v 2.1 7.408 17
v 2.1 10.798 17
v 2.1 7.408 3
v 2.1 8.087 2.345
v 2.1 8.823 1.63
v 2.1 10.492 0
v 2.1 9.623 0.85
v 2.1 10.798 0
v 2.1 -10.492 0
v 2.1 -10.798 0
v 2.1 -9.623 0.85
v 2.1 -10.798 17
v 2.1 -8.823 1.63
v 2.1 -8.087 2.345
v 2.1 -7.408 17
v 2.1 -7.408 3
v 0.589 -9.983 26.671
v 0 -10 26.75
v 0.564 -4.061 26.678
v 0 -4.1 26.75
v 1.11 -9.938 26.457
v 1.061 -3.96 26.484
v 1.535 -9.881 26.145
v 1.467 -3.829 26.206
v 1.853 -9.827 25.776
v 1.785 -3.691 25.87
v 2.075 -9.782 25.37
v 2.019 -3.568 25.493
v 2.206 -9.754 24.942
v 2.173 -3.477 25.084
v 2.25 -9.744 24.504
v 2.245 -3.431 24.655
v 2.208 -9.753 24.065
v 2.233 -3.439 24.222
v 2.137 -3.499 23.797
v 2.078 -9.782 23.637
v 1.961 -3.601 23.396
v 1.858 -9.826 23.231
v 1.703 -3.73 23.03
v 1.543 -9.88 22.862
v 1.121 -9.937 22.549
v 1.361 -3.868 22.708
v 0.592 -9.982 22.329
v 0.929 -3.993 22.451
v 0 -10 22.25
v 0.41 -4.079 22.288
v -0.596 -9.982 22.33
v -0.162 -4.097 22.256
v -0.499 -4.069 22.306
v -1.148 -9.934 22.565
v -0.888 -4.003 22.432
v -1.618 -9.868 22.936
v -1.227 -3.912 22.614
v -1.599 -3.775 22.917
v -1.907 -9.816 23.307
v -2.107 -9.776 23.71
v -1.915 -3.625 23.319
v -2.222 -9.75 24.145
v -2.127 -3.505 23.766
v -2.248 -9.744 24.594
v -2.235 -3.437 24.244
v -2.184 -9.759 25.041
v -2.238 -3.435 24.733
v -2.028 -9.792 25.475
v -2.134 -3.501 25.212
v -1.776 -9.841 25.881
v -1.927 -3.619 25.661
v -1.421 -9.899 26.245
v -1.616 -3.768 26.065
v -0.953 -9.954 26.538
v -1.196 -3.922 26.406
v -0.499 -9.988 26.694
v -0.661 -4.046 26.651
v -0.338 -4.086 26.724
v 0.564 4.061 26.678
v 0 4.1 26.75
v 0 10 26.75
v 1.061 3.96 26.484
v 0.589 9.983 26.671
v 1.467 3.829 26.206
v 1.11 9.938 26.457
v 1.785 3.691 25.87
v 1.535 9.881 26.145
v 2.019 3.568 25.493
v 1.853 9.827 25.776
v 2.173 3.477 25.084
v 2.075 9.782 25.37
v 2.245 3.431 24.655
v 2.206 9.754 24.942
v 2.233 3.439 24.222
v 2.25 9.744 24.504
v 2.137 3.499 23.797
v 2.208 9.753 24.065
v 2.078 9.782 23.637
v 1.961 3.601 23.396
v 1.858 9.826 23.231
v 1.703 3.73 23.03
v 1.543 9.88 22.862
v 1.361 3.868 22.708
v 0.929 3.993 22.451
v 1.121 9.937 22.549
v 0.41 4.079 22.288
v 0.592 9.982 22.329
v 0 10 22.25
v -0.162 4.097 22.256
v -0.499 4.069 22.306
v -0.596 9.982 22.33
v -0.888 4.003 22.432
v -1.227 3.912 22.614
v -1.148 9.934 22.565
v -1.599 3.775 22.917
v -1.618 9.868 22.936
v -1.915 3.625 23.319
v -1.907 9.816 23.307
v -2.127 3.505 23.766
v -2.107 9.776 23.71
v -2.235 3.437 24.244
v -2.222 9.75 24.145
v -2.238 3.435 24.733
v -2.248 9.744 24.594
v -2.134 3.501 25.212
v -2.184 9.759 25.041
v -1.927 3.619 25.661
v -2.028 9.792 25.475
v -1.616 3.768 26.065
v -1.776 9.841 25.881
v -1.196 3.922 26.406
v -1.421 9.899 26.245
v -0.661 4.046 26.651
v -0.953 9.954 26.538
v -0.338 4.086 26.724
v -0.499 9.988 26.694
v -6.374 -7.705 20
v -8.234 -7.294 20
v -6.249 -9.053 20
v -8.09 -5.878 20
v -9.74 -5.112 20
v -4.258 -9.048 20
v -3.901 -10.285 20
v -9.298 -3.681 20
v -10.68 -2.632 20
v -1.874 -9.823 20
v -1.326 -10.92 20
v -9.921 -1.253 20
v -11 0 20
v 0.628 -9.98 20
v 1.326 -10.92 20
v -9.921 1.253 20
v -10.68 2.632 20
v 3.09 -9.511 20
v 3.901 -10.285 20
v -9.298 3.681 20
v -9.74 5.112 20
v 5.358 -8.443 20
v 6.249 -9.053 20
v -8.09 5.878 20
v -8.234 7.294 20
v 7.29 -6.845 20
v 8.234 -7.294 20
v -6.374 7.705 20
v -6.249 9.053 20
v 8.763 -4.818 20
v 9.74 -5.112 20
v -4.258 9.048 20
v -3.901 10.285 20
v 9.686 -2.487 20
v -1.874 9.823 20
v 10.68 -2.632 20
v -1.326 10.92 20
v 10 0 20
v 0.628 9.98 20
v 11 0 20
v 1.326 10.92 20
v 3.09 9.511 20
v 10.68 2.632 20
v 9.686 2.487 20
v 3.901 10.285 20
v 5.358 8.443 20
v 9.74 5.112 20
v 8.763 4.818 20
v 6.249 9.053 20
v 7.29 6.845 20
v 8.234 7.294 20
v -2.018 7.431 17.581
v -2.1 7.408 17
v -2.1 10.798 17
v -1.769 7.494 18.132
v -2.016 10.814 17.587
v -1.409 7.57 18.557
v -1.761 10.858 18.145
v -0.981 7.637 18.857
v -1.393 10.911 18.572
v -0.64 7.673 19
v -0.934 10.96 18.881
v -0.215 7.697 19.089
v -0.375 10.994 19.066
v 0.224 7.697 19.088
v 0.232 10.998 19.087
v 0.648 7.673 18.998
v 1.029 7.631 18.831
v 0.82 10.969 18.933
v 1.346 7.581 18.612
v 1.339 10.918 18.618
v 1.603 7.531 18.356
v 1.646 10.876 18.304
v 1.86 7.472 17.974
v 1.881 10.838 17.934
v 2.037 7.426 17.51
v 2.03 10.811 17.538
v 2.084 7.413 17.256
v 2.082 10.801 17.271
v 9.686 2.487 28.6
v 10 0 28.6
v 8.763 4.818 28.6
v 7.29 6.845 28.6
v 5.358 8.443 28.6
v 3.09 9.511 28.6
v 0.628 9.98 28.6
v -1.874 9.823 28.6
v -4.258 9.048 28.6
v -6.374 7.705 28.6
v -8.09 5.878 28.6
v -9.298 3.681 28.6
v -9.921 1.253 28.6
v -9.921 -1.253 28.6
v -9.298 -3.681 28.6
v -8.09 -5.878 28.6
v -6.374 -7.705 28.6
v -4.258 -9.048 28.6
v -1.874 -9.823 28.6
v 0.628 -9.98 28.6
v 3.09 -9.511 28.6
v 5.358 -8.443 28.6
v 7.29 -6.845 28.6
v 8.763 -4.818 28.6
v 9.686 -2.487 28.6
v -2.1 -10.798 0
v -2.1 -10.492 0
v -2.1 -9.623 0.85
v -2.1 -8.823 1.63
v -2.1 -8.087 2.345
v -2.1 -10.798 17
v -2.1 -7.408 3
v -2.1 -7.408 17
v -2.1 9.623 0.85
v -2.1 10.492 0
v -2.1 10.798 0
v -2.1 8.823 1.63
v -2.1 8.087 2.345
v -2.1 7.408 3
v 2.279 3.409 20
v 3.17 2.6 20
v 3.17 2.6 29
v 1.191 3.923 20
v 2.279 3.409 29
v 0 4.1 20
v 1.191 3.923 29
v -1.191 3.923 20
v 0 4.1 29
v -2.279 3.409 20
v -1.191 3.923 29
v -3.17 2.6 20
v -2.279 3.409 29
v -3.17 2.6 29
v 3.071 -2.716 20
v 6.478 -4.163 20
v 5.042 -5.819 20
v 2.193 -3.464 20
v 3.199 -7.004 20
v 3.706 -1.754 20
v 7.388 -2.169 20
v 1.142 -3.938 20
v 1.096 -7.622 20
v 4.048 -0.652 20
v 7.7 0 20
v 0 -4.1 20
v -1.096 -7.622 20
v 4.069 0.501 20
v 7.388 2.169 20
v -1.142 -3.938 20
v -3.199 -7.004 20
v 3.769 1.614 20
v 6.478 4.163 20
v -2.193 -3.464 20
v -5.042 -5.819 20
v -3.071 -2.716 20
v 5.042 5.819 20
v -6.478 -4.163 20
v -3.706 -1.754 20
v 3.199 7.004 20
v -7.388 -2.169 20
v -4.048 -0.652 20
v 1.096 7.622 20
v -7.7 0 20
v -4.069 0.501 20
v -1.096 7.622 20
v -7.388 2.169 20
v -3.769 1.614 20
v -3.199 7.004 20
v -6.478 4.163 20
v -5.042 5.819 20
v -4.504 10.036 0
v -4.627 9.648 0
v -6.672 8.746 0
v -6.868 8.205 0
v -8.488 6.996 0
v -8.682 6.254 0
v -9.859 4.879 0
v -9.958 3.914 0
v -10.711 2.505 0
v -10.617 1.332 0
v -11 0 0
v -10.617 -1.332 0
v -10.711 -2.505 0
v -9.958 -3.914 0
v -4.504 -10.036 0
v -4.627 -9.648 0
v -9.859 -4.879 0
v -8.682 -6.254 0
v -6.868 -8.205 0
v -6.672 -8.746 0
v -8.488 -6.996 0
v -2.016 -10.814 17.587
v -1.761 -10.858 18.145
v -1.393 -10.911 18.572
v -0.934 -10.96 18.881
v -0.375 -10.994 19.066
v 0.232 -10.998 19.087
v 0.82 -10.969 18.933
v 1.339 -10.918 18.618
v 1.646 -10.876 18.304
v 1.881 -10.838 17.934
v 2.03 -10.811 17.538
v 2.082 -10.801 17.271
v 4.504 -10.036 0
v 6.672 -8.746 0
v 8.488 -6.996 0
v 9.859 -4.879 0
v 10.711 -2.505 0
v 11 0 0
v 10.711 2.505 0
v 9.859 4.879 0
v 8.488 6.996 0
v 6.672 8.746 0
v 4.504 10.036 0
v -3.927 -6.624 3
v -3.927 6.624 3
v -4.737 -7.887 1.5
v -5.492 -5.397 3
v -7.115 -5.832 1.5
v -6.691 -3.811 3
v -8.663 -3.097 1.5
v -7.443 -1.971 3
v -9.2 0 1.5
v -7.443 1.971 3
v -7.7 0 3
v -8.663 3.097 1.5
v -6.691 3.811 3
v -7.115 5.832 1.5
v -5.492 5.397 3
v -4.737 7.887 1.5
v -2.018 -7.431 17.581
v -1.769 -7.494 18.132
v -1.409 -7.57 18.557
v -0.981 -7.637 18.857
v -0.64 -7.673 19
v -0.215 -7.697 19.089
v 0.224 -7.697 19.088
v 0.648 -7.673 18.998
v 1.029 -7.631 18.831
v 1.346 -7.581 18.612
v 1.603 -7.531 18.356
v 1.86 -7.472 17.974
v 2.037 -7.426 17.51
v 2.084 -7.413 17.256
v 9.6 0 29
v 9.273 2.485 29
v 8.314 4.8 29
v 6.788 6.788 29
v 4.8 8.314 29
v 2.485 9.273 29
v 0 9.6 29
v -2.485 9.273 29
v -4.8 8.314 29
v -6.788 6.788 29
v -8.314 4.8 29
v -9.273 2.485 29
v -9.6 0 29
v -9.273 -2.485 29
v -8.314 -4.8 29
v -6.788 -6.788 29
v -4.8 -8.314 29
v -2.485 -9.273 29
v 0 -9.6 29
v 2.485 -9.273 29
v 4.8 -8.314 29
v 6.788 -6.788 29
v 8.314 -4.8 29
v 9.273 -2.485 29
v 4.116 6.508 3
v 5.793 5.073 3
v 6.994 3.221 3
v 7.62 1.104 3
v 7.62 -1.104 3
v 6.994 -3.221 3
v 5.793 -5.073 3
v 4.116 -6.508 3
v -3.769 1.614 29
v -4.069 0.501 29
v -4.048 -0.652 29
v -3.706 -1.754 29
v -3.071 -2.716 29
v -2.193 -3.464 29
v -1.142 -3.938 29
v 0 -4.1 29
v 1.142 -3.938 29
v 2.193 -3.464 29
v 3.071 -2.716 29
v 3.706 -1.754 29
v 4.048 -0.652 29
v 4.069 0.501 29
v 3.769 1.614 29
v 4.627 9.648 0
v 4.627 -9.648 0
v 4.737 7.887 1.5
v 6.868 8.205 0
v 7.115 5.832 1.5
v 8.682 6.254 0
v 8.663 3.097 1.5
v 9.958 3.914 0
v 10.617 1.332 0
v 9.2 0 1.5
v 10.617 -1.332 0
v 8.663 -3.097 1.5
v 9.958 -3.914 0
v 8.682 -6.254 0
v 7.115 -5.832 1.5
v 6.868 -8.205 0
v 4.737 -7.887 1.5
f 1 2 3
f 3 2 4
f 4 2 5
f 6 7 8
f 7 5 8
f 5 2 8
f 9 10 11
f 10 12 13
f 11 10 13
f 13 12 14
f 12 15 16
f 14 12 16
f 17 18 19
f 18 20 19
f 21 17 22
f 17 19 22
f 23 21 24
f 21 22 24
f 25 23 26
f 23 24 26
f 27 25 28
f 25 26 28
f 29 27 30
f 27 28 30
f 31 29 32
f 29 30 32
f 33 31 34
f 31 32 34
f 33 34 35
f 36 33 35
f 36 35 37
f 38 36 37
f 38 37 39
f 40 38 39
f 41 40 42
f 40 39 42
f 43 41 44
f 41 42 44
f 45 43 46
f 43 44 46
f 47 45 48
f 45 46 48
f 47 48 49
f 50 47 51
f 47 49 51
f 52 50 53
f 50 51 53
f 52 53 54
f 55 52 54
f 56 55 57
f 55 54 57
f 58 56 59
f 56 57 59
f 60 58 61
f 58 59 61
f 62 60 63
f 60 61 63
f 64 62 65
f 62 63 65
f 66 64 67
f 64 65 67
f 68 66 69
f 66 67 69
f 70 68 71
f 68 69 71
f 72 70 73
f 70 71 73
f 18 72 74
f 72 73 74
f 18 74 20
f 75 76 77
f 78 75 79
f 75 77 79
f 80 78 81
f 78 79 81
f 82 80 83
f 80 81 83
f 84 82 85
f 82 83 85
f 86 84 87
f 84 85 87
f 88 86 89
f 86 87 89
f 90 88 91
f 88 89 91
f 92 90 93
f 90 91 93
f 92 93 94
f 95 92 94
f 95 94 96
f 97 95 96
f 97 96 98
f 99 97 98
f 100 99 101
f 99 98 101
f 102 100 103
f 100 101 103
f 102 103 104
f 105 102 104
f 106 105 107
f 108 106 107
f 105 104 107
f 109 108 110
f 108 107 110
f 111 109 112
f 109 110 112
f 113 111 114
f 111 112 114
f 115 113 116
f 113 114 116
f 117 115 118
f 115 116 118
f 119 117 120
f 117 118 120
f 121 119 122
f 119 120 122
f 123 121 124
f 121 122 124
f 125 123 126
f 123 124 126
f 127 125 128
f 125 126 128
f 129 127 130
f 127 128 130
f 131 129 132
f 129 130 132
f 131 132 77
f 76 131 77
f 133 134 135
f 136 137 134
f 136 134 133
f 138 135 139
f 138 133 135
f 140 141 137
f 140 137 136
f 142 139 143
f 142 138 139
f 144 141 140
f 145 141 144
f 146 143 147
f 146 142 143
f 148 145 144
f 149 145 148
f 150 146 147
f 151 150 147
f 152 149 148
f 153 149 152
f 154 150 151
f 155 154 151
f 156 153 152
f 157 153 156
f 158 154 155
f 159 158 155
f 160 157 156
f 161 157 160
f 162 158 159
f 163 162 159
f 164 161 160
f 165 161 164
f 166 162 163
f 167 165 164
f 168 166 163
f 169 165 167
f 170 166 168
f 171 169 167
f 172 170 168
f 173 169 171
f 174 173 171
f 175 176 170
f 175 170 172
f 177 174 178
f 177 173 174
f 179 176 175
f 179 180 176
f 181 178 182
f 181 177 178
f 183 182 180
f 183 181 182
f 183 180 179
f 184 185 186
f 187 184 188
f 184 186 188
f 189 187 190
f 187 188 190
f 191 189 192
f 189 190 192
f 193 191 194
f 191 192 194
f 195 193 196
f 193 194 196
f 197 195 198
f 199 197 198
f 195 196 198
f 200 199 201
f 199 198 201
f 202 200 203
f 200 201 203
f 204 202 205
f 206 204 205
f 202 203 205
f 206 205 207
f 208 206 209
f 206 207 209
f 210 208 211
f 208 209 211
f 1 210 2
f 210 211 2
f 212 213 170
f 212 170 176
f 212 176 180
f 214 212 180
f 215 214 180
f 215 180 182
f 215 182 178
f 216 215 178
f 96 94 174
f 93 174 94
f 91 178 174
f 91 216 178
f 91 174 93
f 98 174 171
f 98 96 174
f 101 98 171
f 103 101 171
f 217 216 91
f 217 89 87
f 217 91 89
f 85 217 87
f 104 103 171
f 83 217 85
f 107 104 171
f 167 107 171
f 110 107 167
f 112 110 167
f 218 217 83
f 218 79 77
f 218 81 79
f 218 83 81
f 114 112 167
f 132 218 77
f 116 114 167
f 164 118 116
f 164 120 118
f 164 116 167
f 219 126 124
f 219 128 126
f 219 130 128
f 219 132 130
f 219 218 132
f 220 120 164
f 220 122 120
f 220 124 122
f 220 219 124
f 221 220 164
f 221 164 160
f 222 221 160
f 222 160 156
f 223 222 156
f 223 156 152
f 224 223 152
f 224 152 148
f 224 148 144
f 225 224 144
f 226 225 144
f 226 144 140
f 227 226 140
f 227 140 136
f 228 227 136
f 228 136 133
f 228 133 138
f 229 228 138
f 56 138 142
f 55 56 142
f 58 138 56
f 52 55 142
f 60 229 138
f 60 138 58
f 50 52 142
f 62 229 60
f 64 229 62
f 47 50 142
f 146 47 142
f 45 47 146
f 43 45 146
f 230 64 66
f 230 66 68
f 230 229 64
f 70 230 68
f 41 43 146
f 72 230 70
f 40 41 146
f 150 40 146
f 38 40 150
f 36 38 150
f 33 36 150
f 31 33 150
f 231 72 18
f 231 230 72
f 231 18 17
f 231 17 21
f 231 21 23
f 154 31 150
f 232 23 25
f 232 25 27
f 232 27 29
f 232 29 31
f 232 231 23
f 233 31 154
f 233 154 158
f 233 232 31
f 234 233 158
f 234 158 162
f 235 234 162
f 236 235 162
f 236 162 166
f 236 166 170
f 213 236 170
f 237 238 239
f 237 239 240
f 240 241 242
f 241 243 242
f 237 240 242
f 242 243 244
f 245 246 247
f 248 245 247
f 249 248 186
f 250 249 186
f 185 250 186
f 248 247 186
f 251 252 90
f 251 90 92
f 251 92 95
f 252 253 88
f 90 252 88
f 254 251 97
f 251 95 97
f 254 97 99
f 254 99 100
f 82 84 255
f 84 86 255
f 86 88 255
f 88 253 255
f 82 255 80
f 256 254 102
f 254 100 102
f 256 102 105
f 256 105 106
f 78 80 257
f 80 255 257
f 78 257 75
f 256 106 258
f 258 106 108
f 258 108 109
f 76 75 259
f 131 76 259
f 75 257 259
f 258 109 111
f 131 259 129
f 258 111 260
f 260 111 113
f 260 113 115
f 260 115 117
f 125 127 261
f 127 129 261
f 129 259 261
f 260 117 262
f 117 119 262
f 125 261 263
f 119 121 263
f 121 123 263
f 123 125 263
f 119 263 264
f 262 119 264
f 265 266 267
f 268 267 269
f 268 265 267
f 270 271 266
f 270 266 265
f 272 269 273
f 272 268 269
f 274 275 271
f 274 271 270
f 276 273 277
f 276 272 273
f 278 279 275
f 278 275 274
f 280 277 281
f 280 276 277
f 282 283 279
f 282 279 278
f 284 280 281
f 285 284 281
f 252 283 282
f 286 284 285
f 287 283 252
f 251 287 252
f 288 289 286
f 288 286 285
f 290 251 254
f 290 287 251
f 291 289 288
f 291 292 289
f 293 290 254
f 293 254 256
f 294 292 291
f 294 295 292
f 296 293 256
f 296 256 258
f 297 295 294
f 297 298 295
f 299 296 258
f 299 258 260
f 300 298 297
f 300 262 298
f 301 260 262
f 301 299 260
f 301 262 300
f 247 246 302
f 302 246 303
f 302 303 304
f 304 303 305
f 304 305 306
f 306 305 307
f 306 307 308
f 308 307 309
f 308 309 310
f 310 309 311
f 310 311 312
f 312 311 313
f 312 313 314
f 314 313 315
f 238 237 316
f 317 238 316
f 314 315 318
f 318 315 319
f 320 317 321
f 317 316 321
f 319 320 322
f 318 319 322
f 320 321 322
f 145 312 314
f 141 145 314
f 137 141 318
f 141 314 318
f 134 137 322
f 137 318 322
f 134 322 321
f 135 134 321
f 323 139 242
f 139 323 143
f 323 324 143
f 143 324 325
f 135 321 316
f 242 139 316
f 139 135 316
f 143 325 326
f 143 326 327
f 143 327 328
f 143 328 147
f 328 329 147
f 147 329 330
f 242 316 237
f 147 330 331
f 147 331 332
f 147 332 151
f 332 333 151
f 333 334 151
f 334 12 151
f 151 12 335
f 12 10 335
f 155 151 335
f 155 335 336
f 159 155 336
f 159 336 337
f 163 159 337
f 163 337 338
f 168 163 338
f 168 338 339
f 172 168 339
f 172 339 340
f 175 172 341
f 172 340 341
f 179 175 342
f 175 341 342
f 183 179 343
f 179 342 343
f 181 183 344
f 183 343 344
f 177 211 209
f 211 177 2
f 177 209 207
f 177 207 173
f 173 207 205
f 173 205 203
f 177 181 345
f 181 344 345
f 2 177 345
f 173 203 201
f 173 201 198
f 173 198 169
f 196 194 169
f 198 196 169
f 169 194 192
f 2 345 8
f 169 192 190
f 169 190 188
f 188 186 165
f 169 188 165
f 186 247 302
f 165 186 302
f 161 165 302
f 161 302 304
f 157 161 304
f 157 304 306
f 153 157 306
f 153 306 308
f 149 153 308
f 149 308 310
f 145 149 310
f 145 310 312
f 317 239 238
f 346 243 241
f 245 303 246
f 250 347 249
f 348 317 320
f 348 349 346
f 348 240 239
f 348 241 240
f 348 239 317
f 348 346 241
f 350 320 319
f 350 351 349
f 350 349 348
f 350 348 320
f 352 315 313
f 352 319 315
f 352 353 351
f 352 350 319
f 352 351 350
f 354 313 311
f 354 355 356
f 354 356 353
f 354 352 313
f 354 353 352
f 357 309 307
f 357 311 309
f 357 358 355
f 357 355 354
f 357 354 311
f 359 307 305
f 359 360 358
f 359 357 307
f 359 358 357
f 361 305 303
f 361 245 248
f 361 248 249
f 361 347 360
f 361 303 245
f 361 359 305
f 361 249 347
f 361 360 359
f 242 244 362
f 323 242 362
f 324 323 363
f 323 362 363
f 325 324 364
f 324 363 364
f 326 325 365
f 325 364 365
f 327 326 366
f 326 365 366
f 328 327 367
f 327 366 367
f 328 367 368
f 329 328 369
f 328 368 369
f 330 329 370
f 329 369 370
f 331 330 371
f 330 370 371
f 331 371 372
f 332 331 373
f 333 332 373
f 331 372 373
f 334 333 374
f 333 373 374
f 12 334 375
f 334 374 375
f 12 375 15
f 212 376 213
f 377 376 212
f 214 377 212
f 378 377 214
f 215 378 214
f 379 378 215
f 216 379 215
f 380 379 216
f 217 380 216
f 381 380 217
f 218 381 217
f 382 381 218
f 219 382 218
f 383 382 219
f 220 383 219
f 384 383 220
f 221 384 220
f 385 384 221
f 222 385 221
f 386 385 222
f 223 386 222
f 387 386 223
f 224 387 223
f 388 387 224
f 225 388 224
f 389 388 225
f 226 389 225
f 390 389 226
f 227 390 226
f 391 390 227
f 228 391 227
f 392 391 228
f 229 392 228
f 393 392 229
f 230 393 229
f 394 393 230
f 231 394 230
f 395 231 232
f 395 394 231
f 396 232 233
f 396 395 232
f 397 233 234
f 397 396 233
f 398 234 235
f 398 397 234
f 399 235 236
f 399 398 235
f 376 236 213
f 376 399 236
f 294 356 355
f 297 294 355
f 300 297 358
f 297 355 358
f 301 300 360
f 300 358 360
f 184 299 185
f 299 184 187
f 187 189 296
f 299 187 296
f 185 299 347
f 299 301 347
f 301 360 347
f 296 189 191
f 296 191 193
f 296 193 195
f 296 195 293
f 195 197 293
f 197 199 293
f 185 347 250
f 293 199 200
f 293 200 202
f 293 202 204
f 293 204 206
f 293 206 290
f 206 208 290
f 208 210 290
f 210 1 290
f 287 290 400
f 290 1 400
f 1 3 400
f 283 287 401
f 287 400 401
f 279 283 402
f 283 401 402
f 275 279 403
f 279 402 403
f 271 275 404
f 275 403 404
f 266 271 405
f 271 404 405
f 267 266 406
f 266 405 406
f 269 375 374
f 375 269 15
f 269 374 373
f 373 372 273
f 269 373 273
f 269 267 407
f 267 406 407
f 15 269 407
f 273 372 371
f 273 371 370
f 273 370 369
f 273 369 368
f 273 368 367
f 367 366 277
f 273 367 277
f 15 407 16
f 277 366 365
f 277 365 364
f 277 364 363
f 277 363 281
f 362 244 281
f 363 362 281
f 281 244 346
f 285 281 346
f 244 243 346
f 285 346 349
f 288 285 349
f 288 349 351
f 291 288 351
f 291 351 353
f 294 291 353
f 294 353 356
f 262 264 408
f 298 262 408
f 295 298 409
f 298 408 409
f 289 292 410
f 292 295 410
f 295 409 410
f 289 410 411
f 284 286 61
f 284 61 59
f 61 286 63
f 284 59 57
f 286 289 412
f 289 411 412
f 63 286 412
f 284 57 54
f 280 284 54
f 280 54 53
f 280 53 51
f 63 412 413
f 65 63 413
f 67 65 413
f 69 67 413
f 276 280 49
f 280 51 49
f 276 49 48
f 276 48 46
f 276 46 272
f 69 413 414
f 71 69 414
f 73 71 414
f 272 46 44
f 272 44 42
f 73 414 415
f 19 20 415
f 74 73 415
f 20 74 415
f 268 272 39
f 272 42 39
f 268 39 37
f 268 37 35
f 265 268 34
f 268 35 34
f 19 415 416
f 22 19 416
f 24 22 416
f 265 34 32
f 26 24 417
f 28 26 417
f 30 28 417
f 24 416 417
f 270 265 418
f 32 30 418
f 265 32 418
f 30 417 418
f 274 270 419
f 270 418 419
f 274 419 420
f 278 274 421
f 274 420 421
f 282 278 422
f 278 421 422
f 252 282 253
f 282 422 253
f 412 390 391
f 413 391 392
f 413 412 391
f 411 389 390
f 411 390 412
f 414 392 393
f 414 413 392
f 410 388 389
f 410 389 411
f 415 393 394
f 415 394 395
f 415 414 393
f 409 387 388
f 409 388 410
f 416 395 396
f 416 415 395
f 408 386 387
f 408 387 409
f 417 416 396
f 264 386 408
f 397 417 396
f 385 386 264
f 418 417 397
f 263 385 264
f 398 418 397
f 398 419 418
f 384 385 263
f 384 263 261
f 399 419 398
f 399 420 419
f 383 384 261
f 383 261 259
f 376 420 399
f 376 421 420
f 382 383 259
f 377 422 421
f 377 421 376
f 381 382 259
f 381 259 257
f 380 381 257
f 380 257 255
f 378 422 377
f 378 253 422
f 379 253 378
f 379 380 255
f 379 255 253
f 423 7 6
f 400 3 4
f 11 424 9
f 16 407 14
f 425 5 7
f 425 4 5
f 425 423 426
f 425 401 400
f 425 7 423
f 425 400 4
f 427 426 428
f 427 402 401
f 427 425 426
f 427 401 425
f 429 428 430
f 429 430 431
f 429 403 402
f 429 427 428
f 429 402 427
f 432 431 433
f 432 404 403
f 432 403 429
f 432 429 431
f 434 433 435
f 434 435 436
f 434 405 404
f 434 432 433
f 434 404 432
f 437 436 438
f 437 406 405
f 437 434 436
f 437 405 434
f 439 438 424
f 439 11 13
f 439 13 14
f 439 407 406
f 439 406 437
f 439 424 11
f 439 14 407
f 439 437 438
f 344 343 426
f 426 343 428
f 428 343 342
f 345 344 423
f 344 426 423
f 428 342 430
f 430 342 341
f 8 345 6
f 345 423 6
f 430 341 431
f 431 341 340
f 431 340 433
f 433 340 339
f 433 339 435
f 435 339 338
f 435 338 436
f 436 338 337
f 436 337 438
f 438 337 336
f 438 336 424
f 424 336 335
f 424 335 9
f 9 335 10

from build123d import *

# Parameters (mm, degrees)
SKETCH_1_R           = 11
EXTRUDE_1_DEPTH      = 29
SKETCH_2_OUTSIDE_W   = 32.506
SKETCH_2_OUTSIDE_H   = 32.506
SKETCH_2_OUTSIDE_R   = 10
CUT_EXTRUDE_1_DEPTH  = 9
SKETCH_3_R           = 7.7
CUT_EXTRUDE_2_DEPTH  = 20
SKETCH_4_R           = 2.1
CUT_EXTRUDE_3_DEPTH  = 25
CHAMFER_1_SIZE       = 3
EXTRUDE_START        = 10
SKETCH_5_R           = 10
EXTRUDE_2_DEPTH      = 10
CUT_EXTRUDE_5_DEPTH  = 19
CUT_EXTRUDE_6_DEPTH  = 19
CHAMFER_2_SIZE       = 0.4
SKETCH_12_R          = 10
CUT_EXTRUDE_9_DEPTH  = 10
SKETCH_13_R          = 4.1
CUT_EXTRUDE_10_DEPTH = 9
SKETCH_14_R          = 2.25
CUT_EXTRUDE_11_DEPTH = 25
CHAMFER_3_SIZE       = 0.4


with BuildPart() as part:
    # 草图1 → 凸台-拉伸1 (new body)
    with BuildSketch(Plane.XY):
        with Locations(Location((0, 0, 0), (0, 0, 180))):
            Circle(SKETCH_1_R)
    extrude(amount=EXTRUDE_1_DEPTH)

    # 草图2 outside → 切除-拉伸1 (cut)
    with BuildSketch(Plane.XY.offset(29)):
        Rectangle(SKETCH_2_OUTSIDE_W, SKETCH_2_OUTSIDE_H)
        Circle(SKETCH_2_OUTSIDE_R, mode=Mode.SUBTRACT)
    extrude(amount=-CUT_EXTRUDE_1_DEPTH, mode=Mode.SUBTRACT)

    # 草图3 → 切除-拉伸2 (cut)
    with BuildSketch(Plane(origin=(0, 0, 0), x_dir=(-1, 0, 0), z_dir=(0, 0, -1))):
        Circle(SKETCH_3_R)
    extrude(amount=-CUT_EXTRUDE_2_DEPTH, mode=Mode.SUBTRACT)

    # 草图4 → 切除-拉伸3 (cut, symmetric)
    with BuildSketch(Plane(origin=(0, 0, 0), x_dir=(1, 0, 0), z_dir=(0, 1, 0))):
        with BuildLine():
            Line((-2.1, 0), (-2.1, -17))
            ThreePointArc((-2.1, -17), (0, -14.9), (2.1, -17))
            Line((2.1, -17), (2.1, 0))
            Line((2.1, 0), (-2.1, 0))
        make_face()
        with Locations((0, -17)):
            Circle(SKETCH_4_R)
    extrude(amount=CUT_EXTRUDE_3_DEPTH, both=True, mode=Mode.SUBTRACT)

    # 倒角1
    chamfer_1_edges = [part.edges().sort_by_distance(p)[0] for p in [
        (7.7, 0, 0),
        (-6.142475071, -4.643274706, 0),
    ]]
    chamfer(chamfer_1_edges, length=CHAMFER_1_SIZE)

    # 草图5 → 凸台-拉伸2 (add)
    with BuildSketch(Plane.XY.offset(29).offset(EXTRUDE_START)):
        Circle(SKETCH_5_R)
    extrude(amount=-EXTRUDE_2_DEPTH)

    # 草图6 → 切除-拉伸5 (cut)
    with BuildSketch(Plane.XY.offset(39)):
        with BuildLine():
            Line((3.122498999, 2.5), (-3.122498999, 2.5))
            ThreePointArc((-3.122498999, 2.5), (-1.324764885, -3.774254628), (4, 0))
            ThreePointArc((4, 0), (3.774254628, 1.324764885), (3.122498999, 2.5))
        make_face()
    extrude(amount=-CUT_EXTRUDE_5_DEPTH, mode=Mode.SUBTRACT)

    # 草图7 → 切除-拉伸6 (cut)
    with BuildSketch(Plane.XY.offset(39)):
        with BuildLine():
            Line((3.170173497, 2.6), (-3.170173497, 2.6))
            ThreePointArc((-3.170173497, 2.6), (0, -4.1), (3.170173497, 2.6))
        make_face()
    extrude(amount=-CUT_EXTRUDE_6_DEPTH, mode=Mode.SUBTRACT)

    # 倒角2
    chamfer_2_edges = [part.edges().sort_by_distance(p)[0] for p in [
        (0, -4.1, 39),
        (0, 2.6, 39),
    ]]
    chamfer(chamfer_2_edges, length=CHAMFER_2_SIZE)

    # 草图12 → 切除-拉伸9 (cut)
    with BuildSketch(Plane.XY.offset(39)):
        Circle(SKETCH_12_R)
    extrude(amount=-CUT_EXTRUDE_9_DEPTH, mode=Mode.SUBTRACT)

    # 草图13 → 切除-拉伸10 (cut)
    with BuildSketch(Plane.XY.offset(29)):
        Circle(SKETCH_13_R)
    extrude(amount=-CUT_EXTRUDE_10_DEPTH, mode=Mode.SUBTRACT)

    # 草图14 → 切除-拉伸11 (cut, symmetric)
    with BuildSketch(Plane(origin=(0, 0, 0), x_dir=(1, 0, 0), z_dir=(0, 1, 0))):
        with Locations(Location((0, -24.5, 0), (0, 0, 270))):
            Circle(SKETCH_14_R)
    extrude(amount=CUT_EXTRUDE_11_DEPTH, both=True, mode=Mode.SUBTRACT)

    # 倒角3
    chamfer_3_edges = [part.edges().sort_by_distance(p)[0] for p in [
        (-10, 0, 29),
    ]]
    chamfer(chamfer_3_edges, length=CHAMFER_3_SIZE)


solid = part.part
